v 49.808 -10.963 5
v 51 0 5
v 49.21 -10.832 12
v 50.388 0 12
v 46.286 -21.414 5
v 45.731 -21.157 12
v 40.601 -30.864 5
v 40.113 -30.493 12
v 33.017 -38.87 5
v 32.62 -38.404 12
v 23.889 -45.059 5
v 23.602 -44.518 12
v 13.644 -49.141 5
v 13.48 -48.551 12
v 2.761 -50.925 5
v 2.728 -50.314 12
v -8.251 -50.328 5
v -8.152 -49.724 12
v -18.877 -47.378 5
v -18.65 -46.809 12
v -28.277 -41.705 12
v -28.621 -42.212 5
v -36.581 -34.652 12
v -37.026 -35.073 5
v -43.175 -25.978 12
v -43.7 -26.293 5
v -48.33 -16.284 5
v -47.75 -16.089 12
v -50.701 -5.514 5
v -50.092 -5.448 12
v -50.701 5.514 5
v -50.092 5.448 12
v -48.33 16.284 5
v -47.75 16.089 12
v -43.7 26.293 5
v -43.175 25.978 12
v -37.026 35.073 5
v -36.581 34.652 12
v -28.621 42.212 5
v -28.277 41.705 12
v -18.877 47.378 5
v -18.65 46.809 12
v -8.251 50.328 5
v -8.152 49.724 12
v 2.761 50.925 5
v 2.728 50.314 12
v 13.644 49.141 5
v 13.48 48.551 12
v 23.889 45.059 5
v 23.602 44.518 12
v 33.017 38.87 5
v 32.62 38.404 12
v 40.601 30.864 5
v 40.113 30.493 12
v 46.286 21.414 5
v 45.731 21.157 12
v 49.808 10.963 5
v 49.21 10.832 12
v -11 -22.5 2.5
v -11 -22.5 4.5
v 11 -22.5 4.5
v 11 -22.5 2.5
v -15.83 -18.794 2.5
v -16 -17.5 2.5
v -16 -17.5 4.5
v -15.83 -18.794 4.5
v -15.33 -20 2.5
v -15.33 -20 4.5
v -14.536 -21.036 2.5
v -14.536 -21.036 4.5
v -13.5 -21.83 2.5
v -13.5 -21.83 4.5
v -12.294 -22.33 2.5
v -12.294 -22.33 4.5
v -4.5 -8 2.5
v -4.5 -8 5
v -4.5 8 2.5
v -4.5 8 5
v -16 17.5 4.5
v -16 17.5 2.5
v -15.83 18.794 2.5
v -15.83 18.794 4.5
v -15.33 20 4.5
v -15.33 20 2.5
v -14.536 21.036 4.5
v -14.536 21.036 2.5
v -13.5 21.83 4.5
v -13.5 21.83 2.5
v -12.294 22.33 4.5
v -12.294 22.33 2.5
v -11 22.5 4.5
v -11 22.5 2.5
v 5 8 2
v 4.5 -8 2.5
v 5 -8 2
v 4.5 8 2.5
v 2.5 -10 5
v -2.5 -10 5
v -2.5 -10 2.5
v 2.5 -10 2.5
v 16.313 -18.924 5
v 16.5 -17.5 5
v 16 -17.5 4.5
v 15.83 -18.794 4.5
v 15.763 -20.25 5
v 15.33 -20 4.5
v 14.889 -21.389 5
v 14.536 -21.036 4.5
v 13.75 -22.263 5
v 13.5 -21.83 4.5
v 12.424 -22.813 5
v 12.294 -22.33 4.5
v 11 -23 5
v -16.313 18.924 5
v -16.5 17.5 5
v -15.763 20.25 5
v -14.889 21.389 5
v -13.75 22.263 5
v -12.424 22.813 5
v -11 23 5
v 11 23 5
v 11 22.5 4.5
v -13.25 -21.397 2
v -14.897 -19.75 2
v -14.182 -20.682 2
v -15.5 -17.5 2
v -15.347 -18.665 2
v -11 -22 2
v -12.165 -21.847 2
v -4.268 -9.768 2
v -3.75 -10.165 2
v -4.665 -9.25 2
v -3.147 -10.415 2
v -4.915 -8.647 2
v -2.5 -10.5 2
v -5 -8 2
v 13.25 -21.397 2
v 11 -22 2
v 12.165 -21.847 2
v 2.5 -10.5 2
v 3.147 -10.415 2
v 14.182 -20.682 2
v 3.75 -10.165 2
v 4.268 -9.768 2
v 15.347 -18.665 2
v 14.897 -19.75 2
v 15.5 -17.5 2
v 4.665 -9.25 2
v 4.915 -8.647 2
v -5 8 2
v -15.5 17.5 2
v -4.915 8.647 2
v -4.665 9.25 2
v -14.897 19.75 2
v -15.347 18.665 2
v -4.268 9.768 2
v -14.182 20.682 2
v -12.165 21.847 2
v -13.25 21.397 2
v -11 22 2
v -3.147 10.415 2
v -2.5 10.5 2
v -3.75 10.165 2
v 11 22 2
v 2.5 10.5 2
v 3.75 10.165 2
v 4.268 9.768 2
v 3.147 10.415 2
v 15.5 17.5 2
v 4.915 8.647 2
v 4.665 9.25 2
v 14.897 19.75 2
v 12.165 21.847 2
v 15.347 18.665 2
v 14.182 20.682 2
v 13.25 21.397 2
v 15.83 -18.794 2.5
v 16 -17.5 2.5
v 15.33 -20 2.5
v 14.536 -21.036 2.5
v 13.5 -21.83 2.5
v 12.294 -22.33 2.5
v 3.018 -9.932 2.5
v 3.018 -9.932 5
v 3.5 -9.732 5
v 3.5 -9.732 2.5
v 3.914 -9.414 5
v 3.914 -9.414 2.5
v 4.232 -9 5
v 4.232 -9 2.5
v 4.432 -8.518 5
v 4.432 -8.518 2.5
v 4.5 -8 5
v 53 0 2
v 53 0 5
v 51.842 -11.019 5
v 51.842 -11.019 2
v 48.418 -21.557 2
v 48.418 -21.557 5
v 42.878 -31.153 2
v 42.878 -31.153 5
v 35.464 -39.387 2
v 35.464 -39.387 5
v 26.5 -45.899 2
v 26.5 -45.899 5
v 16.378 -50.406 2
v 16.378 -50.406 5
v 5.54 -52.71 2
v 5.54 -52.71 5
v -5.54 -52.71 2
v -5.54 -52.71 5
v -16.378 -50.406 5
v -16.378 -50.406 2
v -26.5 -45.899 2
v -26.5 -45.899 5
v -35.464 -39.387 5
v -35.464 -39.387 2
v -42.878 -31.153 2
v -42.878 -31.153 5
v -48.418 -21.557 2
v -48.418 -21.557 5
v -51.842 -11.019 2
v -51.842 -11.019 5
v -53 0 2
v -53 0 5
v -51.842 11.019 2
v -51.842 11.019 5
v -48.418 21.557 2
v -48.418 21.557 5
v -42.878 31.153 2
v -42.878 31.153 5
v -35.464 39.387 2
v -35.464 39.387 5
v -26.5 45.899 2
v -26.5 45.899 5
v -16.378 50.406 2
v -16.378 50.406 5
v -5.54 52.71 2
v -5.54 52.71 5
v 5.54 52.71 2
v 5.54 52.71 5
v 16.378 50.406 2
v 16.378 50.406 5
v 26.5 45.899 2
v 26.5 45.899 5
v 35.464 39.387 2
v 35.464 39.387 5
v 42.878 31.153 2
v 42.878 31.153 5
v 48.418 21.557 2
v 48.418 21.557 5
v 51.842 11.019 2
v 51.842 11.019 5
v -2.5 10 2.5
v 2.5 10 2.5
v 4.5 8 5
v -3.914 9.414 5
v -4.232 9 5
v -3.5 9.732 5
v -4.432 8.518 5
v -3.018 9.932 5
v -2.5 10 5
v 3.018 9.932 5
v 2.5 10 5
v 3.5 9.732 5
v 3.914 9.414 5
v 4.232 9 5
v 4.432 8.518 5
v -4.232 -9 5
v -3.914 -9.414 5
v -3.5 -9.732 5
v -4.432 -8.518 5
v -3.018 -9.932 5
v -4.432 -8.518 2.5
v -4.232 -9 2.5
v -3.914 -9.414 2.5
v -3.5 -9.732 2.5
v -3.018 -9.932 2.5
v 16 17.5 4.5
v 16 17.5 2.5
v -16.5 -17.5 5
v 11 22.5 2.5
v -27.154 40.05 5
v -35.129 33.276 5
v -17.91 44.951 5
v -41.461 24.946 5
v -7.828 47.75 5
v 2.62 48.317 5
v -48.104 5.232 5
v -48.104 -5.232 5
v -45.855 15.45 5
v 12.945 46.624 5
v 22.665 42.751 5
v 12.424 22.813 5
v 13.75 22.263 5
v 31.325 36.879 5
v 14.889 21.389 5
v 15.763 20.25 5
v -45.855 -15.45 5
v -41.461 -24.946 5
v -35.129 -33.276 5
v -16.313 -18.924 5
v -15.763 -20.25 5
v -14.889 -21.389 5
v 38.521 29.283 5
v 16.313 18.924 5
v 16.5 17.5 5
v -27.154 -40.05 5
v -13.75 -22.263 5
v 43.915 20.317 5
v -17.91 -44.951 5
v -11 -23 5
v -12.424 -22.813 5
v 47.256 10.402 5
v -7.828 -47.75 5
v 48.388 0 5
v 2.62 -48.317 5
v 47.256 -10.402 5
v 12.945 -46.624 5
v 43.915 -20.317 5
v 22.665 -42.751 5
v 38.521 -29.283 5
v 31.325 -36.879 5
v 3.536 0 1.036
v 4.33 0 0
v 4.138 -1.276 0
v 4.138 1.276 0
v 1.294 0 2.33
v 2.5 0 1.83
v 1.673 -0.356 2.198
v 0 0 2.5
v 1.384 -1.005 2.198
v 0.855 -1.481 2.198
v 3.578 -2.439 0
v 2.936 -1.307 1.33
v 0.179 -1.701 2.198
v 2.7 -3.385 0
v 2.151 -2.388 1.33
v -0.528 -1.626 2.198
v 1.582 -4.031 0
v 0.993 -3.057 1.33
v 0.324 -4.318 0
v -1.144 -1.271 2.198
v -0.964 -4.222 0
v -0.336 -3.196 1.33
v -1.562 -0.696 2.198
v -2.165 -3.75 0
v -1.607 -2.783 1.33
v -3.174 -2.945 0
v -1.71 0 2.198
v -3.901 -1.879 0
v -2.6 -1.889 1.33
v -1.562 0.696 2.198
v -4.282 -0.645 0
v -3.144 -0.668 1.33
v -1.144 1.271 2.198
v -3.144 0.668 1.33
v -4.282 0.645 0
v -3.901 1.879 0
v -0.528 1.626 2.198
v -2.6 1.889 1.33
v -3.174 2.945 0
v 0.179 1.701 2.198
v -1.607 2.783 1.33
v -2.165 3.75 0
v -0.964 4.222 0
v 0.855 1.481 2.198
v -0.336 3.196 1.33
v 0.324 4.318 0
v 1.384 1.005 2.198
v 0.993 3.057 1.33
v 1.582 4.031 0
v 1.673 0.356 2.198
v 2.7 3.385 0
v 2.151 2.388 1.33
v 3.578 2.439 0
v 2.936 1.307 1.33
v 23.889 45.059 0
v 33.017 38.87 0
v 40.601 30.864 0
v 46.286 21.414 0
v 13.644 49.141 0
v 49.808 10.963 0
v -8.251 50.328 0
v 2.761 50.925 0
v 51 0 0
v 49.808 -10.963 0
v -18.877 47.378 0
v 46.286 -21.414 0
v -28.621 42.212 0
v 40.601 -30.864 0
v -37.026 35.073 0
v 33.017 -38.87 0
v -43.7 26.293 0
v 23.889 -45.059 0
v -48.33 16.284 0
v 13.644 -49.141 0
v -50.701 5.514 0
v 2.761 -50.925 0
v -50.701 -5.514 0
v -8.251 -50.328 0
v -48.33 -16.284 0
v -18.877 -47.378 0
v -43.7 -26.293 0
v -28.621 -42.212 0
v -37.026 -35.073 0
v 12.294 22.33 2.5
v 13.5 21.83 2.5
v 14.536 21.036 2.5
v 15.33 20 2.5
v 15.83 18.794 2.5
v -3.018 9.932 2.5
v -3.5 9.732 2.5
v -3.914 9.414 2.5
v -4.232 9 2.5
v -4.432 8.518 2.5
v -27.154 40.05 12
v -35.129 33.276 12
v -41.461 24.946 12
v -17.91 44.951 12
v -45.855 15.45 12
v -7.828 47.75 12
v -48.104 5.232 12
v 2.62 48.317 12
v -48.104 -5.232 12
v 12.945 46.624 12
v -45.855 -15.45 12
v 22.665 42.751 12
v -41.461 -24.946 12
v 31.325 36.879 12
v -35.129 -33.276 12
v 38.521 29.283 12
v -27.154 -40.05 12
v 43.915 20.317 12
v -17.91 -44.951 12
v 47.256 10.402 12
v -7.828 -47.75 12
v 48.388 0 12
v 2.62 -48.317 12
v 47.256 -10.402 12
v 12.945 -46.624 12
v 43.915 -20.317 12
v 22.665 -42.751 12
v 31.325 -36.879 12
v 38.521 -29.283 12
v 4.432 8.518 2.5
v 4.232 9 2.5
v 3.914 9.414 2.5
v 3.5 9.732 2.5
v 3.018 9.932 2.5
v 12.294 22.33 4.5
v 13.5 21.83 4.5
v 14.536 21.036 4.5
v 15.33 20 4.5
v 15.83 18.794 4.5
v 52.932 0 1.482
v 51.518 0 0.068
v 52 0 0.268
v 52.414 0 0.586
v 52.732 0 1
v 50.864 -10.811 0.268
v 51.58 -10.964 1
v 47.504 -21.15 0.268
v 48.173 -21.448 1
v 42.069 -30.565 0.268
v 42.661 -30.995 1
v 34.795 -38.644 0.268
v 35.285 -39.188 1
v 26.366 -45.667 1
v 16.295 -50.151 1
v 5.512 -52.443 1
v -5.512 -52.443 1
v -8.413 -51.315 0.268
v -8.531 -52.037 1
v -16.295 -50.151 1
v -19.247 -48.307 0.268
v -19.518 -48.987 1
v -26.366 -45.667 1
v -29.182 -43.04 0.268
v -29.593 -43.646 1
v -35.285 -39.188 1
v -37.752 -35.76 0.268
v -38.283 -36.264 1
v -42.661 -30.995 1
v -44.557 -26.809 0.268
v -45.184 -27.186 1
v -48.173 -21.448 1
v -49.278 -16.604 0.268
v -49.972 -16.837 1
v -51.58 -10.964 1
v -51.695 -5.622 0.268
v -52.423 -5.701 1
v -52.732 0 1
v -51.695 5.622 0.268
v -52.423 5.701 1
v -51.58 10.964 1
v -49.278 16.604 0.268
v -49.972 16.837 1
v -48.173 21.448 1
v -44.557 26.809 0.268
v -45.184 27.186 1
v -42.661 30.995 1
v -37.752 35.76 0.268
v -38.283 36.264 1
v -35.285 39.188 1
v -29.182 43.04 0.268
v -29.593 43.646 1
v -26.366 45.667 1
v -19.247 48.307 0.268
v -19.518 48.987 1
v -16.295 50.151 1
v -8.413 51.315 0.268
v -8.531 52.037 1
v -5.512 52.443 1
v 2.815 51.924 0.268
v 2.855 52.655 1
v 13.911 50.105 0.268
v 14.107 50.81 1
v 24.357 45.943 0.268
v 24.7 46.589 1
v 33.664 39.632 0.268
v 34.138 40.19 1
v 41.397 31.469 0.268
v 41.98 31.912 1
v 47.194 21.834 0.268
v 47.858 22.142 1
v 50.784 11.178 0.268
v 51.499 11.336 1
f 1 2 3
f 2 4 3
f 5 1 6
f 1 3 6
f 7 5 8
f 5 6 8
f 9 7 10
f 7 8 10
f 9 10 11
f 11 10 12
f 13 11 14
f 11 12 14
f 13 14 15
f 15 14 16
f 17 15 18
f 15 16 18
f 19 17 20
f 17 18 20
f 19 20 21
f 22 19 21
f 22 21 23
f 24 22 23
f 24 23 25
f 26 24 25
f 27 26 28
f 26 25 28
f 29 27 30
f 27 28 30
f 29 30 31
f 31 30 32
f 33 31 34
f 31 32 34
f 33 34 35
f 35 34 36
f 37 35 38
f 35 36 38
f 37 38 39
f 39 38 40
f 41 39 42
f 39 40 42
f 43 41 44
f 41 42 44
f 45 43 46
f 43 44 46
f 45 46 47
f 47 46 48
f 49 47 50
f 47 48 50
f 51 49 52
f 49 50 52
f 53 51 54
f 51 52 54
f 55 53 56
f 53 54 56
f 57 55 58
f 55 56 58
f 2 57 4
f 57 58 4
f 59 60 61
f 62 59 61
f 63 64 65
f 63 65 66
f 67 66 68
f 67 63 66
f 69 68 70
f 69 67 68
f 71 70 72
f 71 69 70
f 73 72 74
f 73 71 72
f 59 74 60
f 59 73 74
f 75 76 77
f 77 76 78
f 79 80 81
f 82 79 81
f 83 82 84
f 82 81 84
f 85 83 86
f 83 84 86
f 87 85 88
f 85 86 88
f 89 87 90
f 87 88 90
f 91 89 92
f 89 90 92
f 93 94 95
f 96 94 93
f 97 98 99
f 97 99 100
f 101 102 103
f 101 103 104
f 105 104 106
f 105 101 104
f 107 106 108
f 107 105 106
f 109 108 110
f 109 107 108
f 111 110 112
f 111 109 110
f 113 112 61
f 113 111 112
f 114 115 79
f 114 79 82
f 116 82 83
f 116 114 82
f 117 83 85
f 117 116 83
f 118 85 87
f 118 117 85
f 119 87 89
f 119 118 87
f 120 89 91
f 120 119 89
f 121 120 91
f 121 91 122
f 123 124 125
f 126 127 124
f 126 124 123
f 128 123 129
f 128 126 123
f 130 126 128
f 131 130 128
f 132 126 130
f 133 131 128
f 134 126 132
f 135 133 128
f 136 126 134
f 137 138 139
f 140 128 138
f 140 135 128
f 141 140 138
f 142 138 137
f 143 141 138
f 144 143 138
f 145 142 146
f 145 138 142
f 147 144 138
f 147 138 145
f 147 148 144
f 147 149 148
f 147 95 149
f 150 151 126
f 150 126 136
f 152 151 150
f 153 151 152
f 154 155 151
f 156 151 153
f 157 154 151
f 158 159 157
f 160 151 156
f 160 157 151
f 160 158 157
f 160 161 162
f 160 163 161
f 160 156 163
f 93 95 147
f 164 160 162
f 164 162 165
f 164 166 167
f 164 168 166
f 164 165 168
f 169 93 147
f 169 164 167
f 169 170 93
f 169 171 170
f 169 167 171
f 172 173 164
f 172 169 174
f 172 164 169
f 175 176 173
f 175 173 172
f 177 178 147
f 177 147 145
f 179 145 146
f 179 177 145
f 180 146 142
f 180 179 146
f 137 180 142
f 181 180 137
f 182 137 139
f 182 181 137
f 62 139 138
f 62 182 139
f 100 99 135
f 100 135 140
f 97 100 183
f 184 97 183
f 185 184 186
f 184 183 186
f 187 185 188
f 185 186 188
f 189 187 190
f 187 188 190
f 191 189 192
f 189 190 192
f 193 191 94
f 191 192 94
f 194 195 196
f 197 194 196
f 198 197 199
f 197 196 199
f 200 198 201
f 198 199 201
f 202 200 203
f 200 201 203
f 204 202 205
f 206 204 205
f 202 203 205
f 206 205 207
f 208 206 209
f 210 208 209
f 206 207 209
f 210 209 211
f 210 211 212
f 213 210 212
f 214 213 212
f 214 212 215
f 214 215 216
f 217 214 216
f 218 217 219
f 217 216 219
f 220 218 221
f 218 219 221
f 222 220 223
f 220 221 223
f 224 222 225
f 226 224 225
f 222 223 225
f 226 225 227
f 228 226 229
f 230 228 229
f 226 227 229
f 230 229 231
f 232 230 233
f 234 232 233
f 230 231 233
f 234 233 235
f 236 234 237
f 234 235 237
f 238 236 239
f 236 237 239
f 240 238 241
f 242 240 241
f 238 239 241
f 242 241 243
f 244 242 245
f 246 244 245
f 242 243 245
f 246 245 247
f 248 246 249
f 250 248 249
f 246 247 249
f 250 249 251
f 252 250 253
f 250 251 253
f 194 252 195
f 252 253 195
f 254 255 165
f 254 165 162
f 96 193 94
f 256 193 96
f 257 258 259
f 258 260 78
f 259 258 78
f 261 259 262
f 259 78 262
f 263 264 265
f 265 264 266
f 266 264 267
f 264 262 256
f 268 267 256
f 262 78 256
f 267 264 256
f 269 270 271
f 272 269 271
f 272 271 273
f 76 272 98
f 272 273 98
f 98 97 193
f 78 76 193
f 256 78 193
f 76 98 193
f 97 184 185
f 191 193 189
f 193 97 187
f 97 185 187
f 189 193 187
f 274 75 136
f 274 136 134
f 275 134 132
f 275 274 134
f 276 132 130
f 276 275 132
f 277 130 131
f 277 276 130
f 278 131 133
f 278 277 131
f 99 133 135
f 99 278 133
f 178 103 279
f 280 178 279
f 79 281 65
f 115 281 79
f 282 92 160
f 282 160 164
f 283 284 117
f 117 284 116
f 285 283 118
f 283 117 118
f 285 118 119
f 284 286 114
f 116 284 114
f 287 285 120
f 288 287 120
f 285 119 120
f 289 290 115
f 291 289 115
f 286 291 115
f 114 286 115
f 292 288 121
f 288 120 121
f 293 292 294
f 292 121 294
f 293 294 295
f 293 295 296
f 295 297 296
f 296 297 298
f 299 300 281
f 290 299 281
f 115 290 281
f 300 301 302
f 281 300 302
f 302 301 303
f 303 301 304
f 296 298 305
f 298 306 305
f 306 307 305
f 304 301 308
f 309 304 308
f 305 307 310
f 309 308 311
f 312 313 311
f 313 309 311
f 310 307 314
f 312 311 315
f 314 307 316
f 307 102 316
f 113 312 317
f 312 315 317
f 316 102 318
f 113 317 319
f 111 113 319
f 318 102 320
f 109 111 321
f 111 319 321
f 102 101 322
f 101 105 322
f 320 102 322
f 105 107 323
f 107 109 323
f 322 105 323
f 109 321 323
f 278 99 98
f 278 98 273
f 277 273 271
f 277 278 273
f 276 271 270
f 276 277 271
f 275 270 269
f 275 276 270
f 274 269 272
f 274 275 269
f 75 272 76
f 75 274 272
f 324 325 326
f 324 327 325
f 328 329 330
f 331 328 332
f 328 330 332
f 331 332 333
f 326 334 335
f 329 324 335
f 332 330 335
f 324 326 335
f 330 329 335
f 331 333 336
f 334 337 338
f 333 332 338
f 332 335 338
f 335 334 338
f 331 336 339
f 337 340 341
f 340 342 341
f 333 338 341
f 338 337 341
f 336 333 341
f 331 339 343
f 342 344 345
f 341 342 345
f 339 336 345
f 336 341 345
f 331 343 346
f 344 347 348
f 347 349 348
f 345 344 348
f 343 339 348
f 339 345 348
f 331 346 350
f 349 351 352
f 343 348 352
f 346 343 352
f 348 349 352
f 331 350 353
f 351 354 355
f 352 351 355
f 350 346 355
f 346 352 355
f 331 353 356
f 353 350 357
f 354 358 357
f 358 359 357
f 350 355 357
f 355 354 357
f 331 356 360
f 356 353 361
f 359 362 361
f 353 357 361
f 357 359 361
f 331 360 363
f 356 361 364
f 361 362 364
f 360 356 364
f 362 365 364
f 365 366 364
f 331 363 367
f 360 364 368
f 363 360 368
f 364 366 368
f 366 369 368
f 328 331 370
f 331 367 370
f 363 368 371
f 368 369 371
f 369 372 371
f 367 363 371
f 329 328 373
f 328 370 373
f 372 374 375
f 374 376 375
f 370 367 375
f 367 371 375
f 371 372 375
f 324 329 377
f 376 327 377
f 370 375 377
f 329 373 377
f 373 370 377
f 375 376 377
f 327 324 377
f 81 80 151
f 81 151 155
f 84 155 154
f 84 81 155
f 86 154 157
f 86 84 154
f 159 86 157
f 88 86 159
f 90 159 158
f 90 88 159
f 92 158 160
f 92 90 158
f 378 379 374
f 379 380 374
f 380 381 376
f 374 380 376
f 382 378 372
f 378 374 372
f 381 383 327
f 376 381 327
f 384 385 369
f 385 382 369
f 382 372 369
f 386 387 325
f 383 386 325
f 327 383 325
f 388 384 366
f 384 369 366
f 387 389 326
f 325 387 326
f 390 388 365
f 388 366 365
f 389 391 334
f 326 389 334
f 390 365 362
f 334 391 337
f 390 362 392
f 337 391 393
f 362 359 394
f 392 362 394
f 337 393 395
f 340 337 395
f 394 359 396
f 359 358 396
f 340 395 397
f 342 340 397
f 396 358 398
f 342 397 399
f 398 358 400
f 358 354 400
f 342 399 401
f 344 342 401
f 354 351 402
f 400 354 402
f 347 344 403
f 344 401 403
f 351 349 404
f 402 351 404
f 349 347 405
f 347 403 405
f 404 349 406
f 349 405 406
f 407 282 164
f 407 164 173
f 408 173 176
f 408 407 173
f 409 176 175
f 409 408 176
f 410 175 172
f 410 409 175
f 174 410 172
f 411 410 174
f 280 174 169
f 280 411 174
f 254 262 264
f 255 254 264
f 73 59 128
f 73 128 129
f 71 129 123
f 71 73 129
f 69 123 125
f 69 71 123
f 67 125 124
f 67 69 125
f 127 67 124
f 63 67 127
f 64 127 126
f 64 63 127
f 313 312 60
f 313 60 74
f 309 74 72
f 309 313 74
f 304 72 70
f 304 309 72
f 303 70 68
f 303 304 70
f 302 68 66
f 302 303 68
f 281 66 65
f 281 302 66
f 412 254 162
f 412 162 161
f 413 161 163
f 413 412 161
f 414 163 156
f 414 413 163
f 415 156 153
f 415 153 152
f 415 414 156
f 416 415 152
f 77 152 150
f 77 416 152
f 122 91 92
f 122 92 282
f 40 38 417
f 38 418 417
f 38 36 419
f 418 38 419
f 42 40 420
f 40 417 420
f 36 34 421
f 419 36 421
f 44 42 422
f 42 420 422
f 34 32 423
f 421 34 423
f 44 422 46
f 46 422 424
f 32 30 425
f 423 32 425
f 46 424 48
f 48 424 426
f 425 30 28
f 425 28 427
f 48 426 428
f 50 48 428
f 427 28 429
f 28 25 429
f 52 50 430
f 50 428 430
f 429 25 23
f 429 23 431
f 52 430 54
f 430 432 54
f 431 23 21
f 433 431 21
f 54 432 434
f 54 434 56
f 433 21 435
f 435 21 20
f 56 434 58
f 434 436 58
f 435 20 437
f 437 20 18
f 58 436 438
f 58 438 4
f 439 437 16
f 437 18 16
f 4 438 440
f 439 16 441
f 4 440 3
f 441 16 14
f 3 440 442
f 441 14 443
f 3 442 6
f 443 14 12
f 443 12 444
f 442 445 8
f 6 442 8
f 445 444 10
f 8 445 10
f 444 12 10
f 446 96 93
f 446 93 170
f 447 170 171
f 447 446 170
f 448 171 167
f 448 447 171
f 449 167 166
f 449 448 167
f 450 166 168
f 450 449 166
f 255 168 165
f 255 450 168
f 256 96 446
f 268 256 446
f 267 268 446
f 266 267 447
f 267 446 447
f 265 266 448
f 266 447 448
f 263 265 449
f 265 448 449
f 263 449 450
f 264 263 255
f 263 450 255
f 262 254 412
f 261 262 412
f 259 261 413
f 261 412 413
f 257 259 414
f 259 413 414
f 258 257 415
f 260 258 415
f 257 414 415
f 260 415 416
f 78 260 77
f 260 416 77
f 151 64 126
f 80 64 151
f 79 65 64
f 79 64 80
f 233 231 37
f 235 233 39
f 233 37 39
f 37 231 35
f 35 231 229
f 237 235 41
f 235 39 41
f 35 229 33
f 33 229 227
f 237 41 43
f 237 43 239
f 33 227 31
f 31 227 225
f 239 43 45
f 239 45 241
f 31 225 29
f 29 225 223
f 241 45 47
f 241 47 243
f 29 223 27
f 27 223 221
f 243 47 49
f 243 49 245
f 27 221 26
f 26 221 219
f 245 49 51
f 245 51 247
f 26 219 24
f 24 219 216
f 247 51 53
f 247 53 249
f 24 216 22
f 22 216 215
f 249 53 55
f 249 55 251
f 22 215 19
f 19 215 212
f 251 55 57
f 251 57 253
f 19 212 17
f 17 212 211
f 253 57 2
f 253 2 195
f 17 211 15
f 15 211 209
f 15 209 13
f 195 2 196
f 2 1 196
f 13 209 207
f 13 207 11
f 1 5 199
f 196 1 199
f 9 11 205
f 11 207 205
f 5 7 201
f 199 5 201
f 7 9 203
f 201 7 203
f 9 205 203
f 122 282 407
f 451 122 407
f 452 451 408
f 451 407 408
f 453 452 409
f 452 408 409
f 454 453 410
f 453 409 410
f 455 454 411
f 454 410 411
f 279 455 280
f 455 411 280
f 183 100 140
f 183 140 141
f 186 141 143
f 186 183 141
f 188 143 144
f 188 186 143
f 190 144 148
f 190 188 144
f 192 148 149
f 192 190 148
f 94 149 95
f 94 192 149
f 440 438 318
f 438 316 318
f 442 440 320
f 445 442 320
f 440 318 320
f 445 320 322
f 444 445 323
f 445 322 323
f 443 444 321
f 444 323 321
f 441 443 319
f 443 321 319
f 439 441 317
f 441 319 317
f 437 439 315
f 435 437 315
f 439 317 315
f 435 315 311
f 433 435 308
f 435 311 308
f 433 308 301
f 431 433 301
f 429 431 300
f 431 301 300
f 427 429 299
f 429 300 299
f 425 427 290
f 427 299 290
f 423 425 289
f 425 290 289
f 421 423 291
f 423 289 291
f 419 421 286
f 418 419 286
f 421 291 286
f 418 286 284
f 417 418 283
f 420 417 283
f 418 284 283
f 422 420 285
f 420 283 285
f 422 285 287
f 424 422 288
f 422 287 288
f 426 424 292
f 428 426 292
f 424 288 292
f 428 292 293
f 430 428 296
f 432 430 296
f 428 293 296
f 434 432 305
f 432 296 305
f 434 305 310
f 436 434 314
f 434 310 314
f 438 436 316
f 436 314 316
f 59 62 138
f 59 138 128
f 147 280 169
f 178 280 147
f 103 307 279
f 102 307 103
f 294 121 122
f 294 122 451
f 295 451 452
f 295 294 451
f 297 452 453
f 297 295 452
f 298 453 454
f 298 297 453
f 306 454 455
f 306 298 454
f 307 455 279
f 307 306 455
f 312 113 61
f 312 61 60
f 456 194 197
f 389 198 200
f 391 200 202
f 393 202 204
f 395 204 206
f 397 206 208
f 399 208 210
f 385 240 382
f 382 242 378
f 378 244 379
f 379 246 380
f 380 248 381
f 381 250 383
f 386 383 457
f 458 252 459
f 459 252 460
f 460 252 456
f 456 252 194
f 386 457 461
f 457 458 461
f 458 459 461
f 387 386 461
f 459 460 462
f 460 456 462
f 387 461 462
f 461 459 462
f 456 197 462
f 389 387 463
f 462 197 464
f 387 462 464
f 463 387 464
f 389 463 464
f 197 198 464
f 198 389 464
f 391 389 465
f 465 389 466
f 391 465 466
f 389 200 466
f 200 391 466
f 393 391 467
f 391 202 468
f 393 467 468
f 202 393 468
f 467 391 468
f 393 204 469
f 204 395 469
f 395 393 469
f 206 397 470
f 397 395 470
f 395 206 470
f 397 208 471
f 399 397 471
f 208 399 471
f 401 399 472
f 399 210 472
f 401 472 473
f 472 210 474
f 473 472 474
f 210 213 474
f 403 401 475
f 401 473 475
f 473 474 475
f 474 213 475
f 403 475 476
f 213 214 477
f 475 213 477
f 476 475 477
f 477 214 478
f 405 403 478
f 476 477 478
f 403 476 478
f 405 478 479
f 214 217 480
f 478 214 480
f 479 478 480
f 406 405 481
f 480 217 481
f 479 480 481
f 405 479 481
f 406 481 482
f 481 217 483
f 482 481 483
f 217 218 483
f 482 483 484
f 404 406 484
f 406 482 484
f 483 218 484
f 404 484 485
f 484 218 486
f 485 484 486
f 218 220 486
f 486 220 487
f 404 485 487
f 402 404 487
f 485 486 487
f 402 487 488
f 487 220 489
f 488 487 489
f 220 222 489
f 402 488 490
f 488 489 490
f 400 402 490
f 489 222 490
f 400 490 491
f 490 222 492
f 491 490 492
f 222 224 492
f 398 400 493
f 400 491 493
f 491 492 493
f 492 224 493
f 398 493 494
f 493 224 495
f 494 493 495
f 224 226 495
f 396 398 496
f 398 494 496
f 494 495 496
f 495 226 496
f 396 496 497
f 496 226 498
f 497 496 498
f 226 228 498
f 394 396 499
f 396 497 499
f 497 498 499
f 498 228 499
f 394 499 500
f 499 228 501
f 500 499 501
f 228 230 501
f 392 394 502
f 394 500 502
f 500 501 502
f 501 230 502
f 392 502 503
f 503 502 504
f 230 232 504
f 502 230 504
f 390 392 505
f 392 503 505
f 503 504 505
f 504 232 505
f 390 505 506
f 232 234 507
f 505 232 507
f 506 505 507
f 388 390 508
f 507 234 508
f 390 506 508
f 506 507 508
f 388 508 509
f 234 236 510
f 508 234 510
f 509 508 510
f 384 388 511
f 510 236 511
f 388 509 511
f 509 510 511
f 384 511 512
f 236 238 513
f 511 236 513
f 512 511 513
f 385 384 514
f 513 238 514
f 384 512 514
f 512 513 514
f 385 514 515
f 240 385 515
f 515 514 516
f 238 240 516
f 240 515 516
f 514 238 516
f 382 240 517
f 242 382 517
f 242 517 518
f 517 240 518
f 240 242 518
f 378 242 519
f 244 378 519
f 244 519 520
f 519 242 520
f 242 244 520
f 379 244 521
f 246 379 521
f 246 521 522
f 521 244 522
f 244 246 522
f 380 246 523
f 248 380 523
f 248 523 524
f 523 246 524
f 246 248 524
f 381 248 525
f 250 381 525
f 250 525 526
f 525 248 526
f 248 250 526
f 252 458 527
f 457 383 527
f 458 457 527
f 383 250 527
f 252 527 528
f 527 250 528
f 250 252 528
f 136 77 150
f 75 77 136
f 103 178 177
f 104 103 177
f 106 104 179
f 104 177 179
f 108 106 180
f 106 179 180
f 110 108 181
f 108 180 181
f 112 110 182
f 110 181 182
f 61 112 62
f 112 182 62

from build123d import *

# Parameters (mm, degrees)
F2_R     = 2
F3_W     = 32
F3_H     = 45
F3_W_2   = 9
F3_H_2   = 20
F4_DEPTH = 3
F5_R     = 5
F6_R     = 2
F7_SIZE  = 0.5


with BuildPart() as f1:
    # F0 (on Front) → F1 (revolve)
    with BuildSketch(Plane.XZ):
        with BuildLine():
            ThreePointArc((0, 2.5), (2.5, 1.830127), (4.330127, 0))
            Line((4.330127, 0), (53, 0))
            Line((53, 0), (53, 5))
            Line((53, 5), (51, 5))
            Line((51, 5), (50.387579, 12))
            Line((50.387579, 12), (48.387579, 12))
            Line((48.387579, 12), (48.387579, 5))
            Line((48.387579, 5), (0, 5))
            Line((0, 5), (0, 2.5))
        make_face()
    revolve(axis=Axis((0, 0, 3.75), (0, 0, -1)))

    # F2
    f2_edges = [f1.edges().sort_by_distance(p)[0] for p in [
        (-53, 0, 0),
    ]]
    fillet(f2_edges, radius=F2_R)

    # F3 (on face) → F4 (cut)
    with BuildSketch(Plane.XY.offset(5)):
        Rectangle(F3_W, F3_H)
        Rectangle(F3_W_2, F3_H_2, mode=Mode.SUBTRACT)
    extrude(amount=-F4_DEPTH, mode=Mode.SUBTRACT)

    # F5
    f5_edges = [f1.edges().sort_by_distance(p)[0] for p in [
        (-16, 22.5, 3.5),
        (16, 22.5, 3.5),
        (16, -22.5, 3.5),
        (-16, -22.5, 3.5),
    ]]
    fillet(f5_edges, radius=F5_R)

    # F6
    f6_edges = [f1.edges().sort_by_distance(p)[0] for p in [
        (-4.5, 10, 3.5),
        (4.5, 10, 3.5),
        (4.5, -10, 3.5),
        (-4.5, -10, 3.5),
    ]]
    fillet(f6_edges, radius=F6_R)

    # F7
    f7_edges = [f1.edges().sort_by_distance(p)[0] for p in [
        (4.5, 0, 2),
        (0, 22.5, 2),
        (0, 22.5, 5),
    ]]
    chamfer(f7_edges, length=F7_SIZE)


solid = f1.part
